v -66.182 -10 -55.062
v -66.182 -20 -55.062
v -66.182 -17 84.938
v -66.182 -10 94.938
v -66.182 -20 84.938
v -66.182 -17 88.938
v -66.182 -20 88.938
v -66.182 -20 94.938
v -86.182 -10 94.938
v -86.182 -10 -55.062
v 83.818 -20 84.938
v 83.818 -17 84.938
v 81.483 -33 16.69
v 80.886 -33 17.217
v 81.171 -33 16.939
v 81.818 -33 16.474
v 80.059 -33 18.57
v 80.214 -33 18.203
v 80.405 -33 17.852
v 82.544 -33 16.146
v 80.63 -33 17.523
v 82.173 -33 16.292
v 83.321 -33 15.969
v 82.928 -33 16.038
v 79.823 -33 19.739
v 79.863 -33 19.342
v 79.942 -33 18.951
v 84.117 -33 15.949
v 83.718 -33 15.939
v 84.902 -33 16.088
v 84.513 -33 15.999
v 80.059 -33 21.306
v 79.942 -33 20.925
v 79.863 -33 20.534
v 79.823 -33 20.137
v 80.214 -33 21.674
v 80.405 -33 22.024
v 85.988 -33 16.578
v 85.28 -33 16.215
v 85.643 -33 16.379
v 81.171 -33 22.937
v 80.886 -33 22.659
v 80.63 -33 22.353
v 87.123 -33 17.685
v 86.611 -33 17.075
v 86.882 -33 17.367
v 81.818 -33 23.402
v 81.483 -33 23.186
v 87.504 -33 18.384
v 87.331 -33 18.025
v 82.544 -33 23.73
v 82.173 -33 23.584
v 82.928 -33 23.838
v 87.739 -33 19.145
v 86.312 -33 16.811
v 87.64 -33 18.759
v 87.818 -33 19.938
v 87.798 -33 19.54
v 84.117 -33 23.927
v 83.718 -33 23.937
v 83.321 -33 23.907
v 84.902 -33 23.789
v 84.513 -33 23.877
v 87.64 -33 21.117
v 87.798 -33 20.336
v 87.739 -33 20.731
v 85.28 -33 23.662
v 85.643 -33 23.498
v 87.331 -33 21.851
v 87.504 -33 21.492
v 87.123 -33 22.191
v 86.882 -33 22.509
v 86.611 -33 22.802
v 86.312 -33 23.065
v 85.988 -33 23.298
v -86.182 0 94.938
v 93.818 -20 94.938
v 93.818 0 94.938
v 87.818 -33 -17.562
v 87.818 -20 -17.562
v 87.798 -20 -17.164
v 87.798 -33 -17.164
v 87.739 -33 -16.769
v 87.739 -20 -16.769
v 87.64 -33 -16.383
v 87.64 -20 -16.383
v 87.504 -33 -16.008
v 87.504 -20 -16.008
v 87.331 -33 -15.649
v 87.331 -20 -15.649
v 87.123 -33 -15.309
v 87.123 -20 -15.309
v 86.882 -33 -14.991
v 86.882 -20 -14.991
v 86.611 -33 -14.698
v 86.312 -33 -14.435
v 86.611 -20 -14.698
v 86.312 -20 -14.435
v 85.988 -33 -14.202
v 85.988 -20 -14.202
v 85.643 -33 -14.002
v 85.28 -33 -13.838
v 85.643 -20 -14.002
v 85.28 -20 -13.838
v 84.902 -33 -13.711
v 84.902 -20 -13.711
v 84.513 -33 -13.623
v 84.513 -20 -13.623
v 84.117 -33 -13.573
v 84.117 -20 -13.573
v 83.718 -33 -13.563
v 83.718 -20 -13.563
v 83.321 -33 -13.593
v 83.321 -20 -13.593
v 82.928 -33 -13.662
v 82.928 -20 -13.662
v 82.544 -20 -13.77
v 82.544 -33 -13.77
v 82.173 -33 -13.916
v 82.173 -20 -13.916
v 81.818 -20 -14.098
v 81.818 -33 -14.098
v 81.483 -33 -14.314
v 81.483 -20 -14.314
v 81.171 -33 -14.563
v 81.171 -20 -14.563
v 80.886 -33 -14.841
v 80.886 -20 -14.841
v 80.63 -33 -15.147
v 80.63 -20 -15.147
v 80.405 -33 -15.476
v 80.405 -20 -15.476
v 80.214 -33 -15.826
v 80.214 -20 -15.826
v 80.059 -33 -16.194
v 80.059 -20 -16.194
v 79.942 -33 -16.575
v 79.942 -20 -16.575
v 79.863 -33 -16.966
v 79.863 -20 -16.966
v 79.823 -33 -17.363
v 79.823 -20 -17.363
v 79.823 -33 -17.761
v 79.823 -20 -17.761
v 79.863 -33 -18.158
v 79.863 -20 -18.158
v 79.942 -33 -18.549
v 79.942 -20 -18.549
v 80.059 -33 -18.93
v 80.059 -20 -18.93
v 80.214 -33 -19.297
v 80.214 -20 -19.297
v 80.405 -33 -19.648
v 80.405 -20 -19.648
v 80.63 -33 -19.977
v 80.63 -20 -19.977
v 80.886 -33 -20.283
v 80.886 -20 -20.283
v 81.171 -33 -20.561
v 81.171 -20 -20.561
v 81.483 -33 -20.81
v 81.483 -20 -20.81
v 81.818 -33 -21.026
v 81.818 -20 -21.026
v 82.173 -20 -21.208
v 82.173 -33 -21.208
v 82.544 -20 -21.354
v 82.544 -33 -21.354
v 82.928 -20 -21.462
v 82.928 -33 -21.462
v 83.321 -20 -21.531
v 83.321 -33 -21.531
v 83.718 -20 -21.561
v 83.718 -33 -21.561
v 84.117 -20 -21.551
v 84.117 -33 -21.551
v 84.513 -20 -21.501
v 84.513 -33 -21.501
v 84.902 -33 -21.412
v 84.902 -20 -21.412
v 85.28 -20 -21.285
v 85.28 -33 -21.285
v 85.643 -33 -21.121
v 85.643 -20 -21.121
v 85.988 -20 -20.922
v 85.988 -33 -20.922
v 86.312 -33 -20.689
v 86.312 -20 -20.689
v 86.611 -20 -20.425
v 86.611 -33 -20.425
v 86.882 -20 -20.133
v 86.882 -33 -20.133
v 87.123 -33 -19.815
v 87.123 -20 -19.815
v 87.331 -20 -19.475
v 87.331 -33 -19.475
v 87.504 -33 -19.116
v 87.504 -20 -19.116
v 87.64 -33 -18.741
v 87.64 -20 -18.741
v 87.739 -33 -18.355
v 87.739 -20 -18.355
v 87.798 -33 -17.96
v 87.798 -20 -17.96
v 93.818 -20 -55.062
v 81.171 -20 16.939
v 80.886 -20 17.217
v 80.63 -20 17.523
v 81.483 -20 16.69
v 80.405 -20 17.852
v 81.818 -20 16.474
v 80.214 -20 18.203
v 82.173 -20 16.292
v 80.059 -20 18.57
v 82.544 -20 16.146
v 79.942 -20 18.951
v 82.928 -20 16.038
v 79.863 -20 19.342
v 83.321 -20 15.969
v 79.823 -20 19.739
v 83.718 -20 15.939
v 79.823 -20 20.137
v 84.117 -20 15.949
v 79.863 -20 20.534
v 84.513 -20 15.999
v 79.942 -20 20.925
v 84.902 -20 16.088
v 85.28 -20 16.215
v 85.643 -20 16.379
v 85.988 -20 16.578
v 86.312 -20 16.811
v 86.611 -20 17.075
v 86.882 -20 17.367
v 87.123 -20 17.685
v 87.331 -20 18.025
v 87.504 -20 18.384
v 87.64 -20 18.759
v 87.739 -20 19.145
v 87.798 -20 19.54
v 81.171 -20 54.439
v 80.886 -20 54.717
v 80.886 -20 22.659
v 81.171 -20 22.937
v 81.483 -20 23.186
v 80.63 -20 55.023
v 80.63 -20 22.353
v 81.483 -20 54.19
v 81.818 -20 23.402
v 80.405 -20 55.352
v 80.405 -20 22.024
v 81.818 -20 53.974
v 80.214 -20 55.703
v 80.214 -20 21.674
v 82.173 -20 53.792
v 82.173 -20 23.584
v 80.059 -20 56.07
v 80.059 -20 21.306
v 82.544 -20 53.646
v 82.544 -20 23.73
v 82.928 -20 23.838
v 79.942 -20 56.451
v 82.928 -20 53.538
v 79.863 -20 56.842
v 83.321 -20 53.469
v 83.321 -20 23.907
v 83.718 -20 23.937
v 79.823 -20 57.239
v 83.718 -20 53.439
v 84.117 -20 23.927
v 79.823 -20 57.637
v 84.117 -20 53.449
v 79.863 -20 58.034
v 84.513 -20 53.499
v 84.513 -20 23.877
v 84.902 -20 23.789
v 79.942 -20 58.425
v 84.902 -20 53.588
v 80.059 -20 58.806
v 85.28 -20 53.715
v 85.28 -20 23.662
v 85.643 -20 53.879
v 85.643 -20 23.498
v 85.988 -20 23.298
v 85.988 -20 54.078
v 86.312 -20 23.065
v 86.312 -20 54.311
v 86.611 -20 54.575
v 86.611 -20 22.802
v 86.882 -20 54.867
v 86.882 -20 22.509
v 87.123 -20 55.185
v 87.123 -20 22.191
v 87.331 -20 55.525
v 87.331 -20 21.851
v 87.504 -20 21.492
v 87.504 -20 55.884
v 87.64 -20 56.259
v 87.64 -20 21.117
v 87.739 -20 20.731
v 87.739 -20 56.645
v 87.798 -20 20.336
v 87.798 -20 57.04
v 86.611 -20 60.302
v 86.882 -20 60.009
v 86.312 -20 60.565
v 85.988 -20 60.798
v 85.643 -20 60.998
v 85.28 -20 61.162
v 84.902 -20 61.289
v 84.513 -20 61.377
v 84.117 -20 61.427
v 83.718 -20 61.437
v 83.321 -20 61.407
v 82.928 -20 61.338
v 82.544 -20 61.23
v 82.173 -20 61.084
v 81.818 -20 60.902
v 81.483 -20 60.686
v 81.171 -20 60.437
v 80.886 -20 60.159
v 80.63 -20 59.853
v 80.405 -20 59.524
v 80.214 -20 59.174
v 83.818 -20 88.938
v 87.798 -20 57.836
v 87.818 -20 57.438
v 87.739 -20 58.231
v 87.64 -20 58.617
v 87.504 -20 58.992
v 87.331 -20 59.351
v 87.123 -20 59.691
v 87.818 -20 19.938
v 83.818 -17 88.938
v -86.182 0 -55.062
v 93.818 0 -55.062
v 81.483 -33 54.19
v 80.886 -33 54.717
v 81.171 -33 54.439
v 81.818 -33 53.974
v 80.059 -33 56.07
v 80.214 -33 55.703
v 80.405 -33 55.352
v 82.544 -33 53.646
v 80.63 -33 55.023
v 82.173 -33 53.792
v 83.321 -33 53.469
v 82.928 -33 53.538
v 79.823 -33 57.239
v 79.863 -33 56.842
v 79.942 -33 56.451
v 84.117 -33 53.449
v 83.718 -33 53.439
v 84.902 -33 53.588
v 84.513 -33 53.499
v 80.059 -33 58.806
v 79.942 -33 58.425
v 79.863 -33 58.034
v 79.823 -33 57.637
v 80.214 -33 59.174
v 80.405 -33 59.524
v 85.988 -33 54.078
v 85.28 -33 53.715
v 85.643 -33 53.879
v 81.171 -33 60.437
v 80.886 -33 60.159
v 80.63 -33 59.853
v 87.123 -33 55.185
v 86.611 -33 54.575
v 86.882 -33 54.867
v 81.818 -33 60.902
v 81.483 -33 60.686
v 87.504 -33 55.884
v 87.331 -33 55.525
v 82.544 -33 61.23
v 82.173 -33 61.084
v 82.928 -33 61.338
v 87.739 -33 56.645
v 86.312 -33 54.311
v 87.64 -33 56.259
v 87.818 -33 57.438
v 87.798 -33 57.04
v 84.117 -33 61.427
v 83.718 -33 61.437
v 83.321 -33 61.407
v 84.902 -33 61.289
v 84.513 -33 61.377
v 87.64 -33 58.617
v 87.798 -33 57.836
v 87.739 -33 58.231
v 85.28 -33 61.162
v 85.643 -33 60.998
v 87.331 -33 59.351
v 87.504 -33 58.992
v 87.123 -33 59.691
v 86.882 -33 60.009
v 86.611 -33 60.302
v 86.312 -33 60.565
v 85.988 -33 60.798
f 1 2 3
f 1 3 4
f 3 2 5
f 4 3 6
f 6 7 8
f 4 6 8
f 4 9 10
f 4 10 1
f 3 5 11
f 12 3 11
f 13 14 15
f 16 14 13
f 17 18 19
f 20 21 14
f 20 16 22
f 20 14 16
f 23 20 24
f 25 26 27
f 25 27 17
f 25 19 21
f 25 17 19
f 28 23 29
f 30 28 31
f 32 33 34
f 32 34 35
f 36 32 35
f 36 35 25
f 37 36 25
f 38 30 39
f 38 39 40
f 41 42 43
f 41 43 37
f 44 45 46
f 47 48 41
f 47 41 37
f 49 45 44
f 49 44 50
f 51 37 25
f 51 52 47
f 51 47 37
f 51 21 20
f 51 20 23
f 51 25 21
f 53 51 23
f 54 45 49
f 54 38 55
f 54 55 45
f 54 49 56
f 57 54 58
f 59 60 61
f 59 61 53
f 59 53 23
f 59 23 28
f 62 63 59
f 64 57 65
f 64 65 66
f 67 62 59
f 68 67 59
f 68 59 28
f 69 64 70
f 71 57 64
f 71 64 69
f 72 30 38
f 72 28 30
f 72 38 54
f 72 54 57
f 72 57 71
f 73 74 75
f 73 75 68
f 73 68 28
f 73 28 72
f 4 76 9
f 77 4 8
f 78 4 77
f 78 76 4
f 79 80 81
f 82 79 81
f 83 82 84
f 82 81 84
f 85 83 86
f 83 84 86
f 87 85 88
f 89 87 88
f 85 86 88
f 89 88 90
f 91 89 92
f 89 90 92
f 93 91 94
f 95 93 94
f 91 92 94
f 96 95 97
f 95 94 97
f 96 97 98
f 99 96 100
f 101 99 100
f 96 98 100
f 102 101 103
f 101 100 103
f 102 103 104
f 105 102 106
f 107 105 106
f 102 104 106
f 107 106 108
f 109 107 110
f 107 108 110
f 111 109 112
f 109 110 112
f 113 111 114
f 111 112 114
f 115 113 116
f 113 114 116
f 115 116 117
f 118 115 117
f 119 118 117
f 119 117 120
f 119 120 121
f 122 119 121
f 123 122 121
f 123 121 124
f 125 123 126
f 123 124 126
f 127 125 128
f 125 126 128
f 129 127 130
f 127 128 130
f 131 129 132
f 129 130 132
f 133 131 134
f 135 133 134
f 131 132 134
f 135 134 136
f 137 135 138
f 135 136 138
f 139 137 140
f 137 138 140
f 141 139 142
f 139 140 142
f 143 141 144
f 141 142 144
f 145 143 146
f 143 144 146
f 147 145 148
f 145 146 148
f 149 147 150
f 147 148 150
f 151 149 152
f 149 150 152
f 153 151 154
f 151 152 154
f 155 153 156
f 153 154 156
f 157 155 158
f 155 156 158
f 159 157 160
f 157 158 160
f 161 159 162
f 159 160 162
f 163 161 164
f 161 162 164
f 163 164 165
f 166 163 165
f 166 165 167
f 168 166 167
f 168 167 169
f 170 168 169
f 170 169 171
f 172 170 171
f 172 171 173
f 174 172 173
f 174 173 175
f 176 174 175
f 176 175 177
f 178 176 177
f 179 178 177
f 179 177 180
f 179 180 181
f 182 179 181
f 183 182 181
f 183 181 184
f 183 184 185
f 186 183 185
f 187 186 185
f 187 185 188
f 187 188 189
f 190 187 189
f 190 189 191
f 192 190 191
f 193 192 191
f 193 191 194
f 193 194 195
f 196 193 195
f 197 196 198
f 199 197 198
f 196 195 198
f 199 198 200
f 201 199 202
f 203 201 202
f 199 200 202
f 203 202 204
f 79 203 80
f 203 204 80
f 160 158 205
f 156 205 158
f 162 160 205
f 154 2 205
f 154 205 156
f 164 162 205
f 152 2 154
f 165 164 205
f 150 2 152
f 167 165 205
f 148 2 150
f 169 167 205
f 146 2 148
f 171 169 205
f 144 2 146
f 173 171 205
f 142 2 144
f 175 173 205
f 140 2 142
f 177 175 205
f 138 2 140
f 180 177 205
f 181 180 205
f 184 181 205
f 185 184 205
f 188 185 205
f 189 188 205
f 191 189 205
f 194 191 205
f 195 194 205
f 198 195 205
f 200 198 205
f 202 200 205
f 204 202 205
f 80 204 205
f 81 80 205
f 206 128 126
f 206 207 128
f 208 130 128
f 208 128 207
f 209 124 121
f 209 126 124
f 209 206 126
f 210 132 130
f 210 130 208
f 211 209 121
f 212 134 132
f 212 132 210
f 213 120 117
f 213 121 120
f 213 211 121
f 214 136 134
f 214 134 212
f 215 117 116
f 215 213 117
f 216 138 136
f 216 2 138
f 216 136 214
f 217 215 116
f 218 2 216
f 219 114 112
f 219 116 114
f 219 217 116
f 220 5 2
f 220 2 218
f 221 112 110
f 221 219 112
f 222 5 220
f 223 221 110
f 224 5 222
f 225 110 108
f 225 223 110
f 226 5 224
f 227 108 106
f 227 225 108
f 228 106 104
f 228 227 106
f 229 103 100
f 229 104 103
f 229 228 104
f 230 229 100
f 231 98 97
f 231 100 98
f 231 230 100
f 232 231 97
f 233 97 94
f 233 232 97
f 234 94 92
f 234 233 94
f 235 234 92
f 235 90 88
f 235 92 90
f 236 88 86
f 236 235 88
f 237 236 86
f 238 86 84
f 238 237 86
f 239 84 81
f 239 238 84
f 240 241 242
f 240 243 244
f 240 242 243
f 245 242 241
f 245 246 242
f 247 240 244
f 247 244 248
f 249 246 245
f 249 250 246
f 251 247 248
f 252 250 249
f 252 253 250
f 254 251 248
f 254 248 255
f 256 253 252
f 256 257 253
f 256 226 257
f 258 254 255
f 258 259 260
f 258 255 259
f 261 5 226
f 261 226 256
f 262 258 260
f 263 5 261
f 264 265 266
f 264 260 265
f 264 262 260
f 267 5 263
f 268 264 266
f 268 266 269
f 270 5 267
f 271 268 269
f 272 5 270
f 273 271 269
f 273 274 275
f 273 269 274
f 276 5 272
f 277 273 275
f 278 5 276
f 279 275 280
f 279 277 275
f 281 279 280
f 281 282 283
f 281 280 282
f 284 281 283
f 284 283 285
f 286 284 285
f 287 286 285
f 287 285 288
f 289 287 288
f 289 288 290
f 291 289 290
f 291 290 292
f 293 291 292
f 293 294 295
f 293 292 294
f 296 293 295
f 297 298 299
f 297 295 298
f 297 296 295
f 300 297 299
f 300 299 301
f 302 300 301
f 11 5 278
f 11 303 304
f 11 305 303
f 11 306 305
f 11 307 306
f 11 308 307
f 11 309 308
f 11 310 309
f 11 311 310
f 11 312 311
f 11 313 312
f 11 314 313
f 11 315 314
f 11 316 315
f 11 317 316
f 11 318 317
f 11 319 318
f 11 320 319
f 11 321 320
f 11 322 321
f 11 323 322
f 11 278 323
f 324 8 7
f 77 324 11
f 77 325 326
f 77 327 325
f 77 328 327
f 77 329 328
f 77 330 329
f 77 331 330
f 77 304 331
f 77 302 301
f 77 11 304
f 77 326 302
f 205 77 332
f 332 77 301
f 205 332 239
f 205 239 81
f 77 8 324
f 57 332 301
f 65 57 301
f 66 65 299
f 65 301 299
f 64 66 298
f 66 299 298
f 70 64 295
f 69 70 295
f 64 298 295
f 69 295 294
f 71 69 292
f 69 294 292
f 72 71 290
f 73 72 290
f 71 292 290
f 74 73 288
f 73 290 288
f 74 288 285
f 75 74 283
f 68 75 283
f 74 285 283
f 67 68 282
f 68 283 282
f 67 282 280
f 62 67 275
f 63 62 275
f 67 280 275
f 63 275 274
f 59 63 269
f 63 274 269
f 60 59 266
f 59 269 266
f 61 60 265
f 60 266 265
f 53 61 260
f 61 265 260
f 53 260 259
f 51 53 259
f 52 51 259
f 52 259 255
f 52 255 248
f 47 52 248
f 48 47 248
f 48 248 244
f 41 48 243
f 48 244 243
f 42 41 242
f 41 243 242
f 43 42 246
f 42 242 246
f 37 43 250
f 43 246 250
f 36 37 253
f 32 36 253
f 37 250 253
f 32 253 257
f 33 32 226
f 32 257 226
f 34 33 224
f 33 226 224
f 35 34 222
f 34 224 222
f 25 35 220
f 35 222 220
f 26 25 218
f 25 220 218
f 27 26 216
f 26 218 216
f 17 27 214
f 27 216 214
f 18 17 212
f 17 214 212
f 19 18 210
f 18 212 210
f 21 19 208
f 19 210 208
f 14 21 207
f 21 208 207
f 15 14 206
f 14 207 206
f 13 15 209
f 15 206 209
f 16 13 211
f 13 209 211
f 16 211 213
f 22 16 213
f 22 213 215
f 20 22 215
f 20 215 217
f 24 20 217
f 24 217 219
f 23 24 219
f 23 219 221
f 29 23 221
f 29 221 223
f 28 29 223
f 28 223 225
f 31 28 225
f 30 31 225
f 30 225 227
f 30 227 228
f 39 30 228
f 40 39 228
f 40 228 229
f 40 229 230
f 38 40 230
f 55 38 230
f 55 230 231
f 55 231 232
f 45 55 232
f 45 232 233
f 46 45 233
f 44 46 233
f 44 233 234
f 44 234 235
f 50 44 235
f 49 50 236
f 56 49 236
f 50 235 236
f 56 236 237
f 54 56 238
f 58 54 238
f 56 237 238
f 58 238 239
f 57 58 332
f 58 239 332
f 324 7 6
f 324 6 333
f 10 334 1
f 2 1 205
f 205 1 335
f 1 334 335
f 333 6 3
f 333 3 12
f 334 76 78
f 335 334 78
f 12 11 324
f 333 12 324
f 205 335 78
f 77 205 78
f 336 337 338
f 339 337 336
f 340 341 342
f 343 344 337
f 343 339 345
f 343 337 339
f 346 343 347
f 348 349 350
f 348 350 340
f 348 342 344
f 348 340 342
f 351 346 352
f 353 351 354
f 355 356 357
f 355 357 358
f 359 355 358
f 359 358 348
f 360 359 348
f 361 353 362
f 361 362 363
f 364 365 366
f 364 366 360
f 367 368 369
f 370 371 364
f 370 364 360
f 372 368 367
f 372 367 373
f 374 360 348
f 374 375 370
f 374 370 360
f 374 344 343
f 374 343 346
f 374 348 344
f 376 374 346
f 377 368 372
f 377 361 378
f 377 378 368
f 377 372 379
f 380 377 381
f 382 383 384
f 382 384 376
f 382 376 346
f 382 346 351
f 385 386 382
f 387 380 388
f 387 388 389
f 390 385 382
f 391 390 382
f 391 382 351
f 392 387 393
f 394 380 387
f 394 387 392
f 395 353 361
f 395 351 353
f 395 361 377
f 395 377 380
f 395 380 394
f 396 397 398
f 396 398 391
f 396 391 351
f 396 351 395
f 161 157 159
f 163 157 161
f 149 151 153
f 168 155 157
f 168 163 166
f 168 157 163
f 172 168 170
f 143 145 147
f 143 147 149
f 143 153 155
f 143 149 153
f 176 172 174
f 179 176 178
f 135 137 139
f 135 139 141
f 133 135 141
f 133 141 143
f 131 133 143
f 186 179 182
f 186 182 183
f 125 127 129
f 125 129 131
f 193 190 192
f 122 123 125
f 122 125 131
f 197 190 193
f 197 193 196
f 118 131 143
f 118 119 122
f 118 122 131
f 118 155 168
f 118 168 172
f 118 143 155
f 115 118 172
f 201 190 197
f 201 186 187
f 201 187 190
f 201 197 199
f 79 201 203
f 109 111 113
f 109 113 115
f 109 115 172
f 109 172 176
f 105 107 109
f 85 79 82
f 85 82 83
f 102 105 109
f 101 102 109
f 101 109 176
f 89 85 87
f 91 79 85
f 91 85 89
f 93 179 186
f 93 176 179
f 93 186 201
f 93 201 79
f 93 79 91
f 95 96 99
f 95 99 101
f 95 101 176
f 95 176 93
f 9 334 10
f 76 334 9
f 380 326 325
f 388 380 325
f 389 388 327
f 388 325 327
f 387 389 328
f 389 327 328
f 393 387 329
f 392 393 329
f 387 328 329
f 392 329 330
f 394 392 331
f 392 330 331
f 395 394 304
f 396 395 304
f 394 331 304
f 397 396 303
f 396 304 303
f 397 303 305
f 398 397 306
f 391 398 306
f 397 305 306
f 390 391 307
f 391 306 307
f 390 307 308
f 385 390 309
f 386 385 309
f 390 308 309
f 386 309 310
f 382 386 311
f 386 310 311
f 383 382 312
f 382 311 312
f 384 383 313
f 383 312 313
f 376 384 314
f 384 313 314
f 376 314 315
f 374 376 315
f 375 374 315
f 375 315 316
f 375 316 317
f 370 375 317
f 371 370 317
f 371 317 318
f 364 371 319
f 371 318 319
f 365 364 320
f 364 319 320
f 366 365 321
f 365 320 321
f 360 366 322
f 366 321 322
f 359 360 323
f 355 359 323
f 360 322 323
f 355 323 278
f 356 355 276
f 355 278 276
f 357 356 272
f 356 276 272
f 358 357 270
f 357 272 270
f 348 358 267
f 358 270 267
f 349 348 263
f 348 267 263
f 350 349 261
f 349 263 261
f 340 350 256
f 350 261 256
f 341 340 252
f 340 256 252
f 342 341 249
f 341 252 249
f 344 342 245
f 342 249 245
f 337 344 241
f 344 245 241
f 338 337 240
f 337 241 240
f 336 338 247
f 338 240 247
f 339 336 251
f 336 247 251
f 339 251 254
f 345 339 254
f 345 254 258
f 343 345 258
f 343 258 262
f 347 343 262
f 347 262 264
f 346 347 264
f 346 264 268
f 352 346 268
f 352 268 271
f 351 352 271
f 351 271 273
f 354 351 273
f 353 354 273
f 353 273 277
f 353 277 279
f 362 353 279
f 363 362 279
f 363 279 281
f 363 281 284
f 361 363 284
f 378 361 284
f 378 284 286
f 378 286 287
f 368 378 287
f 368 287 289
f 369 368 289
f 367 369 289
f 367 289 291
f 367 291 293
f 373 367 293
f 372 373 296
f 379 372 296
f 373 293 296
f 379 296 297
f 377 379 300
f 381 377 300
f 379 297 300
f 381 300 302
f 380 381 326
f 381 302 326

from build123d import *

# Parameters (mm, degrees)
F0_W     = 180
F0_H     = 150
F1_DEPTH = 20
F2_W     = 20
F2_H     = 150
F3_DEPTH = 10
F4_R     = 4
F5_DEPTH = 13
F6_W     = 150
F6_H     = 4
F7_DEPTH = 3


with BuildPart() as f1:
    # F0 (on Front) → F1 (new body)
    with BuildSketch(Plane.XZ):
        with Locations((3.818182, 19.938081)):
            Rectangle(F0_W, F0_H)
    extrude(amount=F1_DEPTH)

    # F2 (on face) → F3 (cut)
    with BuildSketch(Plane.XZ.offset(20)):
        with Locations((-76.181818, 19.938081)):
            Rectangle(F2_W, F2_H)
    extrude(amount=-F3_DEPTH, mode=Mode.SUBTRACT)

    # F4 (on face) → F5 (join)
    with BuildSketch(Plane.XZ.offset(20)):
        with Locations((83.818182, 57.438081)):
            Circle(F4_R)
        with Locations((83.818182, 19.938081)):
            Circle(F4_R)
        with Locations((83.818182, -17.561919)):
            Circle(F4_R)
    extrude(amount=F5_DEPTH)

    # F6 (on face) → F7 (cut)
    with BuildSketch(Plane.XZ.offset(20)):
        with Locations((8.818182, 86.938081)):
            Rectangle(F6_W, F6_H)
    extrude(amount=-F7_DEPTH, mode=Mode.SUBTRACT)


solid = f1.part
